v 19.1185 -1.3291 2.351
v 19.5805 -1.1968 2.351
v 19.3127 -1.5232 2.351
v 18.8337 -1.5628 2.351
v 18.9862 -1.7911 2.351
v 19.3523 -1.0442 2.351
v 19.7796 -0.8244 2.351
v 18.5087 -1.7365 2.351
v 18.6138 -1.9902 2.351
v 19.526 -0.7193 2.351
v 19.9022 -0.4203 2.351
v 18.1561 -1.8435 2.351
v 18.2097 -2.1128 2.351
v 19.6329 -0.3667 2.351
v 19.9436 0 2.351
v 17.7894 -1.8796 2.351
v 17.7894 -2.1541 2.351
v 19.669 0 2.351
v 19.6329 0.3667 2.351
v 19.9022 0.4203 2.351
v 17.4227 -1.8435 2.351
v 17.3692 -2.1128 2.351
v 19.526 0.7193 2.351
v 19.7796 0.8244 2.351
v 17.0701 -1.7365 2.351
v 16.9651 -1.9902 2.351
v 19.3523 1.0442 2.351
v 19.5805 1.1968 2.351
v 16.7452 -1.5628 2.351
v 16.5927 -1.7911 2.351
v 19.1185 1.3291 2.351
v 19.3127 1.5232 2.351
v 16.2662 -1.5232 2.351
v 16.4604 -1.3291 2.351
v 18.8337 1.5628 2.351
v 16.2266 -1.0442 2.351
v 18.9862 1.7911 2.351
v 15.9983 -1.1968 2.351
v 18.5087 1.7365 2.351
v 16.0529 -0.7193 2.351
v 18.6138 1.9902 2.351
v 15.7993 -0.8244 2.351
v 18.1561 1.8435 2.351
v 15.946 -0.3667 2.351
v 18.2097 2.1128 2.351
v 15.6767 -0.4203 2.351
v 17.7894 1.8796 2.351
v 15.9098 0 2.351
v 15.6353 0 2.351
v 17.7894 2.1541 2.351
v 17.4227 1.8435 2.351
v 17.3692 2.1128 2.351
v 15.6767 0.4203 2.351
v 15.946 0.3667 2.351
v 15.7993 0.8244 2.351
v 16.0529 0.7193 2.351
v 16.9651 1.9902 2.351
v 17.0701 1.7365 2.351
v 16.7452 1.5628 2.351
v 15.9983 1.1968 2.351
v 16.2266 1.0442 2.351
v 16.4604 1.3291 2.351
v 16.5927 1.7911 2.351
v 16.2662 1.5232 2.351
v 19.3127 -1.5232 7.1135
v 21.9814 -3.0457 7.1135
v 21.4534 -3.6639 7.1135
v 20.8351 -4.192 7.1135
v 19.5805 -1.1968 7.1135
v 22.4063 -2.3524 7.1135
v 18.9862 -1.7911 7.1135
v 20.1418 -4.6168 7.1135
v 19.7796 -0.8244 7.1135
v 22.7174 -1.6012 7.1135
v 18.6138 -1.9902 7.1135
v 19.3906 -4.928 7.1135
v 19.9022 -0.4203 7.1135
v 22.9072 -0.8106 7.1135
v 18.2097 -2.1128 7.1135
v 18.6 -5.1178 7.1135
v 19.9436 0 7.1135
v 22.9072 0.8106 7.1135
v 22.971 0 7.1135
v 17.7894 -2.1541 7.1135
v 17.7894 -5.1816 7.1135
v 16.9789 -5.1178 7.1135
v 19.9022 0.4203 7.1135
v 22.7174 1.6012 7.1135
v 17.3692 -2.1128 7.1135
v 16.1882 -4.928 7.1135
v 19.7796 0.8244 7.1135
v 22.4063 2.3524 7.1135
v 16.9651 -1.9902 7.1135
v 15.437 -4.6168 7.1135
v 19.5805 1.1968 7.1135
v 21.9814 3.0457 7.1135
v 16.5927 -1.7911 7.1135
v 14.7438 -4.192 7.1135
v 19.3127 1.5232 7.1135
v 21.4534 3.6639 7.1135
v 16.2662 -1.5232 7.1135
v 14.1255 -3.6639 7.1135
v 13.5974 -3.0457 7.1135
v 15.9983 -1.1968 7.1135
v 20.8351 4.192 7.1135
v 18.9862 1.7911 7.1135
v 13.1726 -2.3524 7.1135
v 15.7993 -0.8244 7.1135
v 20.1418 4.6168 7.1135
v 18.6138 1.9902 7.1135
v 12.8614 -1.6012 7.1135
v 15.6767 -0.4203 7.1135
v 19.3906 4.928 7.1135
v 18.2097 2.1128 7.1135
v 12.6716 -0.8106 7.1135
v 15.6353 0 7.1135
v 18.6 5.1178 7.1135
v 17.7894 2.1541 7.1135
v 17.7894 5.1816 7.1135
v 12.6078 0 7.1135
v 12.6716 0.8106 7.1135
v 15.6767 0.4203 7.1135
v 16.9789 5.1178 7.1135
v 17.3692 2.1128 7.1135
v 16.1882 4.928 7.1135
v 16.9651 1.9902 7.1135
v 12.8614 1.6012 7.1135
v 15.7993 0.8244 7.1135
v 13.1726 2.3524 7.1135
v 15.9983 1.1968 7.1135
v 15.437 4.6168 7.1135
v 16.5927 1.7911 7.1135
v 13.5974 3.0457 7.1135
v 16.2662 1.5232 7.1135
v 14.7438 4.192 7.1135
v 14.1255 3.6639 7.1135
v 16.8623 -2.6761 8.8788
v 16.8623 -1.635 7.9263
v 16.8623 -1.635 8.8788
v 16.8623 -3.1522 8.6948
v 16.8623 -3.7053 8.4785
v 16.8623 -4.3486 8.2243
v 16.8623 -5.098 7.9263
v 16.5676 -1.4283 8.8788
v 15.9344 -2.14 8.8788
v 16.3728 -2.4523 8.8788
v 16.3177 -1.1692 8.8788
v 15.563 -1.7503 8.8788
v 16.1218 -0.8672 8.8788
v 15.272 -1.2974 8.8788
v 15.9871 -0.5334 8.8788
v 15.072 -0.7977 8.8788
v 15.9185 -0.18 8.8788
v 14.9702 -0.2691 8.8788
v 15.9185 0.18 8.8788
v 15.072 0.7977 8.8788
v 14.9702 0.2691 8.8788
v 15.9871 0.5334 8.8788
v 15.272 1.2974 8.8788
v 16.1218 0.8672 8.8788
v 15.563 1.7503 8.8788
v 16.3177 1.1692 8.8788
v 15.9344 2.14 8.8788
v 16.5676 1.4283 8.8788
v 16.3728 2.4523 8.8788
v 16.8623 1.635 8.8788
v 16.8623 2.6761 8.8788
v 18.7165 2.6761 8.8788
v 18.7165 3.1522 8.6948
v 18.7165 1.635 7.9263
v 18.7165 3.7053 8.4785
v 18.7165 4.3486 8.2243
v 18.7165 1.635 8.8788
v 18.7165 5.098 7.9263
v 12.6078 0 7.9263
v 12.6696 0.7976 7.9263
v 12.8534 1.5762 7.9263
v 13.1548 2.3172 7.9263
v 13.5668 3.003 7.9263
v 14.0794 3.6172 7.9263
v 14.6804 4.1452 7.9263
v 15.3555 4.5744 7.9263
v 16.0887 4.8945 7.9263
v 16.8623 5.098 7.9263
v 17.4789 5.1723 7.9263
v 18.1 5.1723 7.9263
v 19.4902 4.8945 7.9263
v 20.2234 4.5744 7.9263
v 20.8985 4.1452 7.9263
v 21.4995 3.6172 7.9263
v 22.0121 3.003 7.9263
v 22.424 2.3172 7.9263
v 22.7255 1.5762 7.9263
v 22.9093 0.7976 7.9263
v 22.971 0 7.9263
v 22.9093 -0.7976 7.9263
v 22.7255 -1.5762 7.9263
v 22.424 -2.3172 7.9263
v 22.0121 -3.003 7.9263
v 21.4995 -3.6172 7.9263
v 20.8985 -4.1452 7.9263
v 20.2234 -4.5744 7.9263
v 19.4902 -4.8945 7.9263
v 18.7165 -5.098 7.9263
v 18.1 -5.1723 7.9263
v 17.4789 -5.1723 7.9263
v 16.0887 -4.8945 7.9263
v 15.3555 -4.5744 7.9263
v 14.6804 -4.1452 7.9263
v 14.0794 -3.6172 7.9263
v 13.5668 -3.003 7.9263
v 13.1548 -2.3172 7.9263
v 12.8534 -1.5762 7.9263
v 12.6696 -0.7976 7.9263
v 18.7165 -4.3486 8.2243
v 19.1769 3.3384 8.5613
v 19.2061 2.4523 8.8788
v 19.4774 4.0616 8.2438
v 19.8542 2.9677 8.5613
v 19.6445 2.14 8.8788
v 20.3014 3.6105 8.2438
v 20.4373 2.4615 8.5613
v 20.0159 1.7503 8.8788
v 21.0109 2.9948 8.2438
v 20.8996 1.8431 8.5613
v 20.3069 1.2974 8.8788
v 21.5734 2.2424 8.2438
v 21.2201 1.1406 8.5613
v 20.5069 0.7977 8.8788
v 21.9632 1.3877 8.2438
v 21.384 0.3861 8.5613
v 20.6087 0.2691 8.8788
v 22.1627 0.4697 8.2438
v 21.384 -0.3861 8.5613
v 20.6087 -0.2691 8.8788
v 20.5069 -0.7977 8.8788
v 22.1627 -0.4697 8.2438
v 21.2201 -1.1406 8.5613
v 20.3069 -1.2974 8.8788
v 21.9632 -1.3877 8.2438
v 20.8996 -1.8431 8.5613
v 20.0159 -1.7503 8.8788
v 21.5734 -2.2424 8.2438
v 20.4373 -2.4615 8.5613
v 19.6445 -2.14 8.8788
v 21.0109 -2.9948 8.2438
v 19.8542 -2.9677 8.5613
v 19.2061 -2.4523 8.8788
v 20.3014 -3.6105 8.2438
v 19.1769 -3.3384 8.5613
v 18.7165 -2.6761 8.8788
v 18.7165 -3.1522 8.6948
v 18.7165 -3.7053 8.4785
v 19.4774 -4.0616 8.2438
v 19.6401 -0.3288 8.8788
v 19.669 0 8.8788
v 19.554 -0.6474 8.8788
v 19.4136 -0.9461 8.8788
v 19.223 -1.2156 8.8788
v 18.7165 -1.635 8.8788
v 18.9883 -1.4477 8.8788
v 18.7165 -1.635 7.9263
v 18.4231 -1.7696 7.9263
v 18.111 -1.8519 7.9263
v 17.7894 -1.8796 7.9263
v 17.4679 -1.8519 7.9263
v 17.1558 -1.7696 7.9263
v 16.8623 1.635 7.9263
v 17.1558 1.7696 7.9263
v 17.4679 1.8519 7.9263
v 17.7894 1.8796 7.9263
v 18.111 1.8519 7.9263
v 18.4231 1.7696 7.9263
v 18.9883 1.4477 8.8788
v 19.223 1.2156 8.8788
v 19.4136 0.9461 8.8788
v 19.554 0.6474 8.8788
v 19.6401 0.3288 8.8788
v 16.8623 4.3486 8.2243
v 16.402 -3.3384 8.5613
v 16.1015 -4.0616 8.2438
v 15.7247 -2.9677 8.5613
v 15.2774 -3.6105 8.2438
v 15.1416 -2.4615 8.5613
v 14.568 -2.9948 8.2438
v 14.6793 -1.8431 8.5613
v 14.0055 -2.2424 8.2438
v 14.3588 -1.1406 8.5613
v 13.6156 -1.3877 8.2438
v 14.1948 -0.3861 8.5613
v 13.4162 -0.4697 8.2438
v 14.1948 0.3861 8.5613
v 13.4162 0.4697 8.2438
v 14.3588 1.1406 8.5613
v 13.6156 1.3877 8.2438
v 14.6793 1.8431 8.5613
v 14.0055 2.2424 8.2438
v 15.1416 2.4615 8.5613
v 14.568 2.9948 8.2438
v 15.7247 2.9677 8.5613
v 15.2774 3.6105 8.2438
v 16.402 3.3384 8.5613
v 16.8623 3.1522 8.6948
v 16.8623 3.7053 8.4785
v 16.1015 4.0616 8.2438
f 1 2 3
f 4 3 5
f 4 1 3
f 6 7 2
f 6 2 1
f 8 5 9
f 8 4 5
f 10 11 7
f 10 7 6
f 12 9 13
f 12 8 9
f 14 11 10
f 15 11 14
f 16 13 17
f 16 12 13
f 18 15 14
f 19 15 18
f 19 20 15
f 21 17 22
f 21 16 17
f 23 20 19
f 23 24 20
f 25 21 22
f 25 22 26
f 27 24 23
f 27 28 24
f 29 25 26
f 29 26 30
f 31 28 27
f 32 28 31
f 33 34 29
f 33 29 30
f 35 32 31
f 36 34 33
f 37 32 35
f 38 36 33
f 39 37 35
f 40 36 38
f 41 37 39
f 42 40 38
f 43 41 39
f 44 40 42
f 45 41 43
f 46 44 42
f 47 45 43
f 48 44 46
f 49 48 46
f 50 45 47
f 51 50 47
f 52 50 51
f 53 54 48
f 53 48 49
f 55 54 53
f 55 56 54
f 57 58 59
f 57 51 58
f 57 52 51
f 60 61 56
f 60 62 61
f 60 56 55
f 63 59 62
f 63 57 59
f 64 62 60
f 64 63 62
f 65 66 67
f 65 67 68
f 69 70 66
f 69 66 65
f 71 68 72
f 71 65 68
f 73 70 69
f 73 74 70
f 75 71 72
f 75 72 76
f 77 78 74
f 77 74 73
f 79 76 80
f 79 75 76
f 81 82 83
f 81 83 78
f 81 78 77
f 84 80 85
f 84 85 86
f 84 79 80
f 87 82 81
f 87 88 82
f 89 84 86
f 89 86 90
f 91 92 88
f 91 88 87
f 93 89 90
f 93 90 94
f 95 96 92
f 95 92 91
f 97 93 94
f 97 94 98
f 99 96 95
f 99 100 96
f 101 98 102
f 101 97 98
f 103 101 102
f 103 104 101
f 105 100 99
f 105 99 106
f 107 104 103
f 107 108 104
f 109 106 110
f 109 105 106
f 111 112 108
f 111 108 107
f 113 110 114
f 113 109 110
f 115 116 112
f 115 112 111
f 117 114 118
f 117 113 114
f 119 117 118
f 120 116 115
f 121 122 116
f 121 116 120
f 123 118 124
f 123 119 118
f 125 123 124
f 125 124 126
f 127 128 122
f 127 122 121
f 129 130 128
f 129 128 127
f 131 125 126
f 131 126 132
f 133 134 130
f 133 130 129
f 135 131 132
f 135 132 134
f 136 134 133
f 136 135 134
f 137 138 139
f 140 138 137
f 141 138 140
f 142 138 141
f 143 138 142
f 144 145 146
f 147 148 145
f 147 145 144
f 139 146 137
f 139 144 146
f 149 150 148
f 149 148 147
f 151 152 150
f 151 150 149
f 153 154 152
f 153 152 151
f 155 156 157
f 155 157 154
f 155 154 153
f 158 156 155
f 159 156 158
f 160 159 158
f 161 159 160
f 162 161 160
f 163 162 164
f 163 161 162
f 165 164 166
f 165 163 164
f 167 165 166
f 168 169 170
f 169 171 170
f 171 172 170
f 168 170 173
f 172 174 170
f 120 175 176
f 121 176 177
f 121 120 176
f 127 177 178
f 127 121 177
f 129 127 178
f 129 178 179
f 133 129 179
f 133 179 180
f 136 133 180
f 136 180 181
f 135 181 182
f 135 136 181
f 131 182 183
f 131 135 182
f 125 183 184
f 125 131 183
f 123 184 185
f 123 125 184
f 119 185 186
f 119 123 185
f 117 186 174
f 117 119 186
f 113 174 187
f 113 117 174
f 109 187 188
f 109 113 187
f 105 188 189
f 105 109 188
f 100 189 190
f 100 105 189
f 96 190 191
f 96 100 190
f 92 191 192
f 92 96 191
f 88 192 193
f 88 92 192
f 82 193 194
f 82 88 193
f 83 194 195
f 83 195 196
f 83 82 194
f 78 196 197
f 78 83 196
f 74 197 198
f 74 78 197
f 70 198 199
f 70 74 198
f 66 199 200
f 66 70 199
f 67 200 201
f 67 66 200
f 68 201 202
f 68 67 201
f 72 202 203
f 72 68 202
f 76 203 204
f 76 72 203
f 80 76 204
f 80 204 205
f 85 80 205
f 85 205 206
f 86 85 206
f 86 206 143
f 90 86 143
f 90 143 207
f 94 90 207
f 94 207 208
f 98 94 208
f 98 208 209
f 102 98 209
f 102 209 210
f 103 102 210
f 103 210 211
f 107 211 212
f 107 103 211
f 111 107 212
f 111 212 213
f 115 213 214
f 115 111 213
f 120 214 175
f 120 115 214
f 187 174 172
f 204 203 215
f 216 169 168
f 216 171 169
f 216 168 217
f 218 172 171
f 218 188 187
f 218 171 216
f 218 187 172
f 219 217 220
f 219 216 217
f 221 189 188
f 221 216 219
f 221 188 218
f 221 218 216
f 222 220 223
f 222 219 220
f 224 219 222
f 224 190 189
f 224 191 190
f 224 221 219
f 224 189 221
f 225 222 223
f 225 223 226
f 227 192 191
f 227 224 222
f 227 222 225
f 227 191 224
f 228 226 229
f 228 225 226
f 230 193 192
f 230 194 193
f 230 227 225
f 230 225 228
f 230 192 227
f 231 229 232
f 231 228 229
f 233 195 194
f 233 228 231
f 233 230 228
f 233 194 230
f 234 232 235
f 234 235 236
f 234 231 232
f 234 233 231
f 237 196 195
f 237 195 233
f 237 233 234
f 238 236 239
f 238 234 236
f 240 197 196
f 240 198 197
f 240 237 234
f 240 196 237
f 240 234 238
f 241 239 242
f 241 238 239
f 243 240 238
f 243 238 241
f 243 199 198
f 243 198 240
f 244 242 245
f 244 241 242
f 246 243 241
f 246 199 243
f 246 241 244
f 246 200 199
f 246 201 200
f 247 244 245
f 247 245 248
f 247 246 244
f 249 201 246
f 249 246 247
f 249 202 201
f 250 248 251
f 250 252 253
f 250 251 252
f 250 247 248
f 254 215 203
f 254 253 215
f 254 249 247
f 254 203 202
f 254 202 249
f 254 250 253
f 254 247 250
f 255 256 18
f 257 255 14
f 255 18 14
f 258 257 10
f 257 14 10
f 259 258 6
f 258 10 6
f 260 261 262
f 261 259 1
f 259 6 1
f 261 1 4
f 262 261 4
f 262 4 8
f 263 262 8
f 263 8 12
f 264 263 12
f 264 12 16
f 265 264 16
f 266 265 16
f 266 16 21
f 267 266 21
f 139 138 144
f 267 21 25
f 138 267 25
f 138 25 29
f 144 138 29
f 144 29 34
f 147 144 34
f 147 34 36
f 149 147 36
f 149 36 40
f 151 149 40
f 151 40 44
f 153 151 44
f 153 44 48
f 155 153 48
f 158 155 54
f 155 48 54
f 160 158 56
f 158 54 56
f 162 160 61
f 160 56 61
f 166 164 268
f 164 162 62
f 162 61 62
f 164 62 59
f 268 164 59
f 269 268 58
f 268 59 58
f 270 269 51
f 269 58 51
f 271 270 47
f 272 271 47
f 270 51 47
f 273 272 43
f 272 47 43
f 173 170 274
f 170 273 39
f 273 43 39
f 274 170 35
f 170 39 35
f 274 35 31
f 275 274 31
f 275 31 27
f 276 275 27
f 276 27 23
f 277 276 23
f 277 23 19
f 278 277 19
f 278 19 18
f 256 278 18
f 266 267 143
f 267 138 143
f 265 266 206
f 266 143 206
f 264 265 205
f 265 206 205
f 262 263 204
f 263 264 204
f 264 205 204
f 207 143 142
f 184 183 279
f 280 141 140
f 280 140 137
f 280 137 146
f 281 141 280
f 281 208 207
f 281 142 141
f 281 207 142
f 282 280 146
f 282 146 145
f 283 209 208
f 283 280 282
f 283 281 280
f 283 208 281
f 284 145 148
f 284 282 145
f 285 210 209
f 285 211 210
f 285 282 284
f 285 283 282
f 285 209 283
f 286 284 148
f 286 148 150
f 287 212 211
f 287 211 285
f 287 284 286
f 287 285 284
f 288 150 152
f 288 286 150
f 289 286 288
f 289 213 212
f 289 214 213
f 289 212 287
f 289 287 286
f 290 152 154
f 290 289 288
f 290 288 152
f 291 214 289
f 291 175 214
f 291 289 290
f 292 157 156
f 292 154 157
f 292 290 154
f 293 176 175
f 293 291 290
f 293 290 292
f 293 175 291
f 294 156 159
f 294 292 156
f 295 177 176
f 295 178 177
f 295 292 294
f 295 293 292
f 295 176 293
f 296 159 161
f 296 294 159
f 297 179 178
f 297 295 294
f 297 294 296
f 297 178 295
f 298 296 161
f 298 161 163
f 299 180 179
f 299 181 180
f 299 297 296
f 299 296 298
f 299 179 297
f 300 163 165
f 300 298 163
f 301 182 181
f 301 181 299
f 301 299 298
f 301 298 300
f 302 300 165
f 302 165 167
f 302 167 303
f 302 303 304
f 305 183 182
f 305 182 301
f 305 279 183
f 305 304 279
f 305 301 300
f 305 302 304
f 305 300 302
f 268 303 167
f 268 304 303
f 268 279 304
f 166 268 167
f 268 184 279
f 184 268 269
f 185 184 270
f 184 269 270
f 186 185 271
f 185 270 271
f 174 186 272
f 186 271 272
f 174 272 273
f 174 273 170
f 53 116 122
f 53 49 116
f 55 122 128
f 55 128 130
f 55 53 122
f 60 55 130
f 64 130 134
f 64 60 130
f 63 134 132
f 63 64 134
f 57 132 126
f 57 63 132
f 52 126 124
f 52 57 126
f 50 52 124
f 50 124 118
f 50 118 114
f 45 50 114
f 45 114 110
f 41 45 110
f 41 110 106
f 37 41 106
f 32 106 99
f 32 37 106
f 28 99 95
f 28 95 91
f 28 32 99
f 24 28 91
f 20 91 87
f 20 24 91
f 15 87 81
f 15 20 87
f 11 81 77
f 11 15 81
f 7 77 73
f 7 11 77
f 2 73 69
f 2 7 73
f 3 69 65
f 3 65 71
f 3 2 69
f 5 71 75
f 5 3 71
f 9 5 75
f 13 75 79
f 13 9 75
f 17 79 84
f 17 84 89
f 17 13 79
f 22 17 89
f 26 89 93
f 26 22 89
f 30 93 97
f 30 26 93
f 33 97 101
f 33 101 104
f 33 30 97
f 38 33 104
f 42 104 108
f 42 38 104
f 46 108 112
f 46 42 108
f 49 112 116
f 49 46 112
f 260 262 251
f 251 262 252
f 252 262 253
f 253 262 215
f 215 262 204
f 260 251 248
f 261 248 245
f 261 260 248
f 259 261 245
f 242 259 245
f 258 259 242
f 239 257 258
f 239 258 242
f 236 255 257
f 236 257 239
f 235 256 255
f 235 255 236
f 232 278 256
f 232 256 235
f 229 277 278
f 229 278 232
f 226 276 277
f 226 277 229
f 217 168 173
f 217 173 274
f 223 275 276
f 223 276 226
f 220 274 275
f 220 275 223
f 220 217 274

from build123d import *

# Parameters (mm, degrees)
F2_W     = 1.8542
F2_H     = 0.9525
F3_DEPTH = 6.35
F4_R     = 1.8796
F5_DEPTH = 6.5288


with BuildPart() as f1:
    # F0 (on Front) → F1 (revolve)
    with BuildSketch(Plane.XZ):
        Polygon((17.789439, 2.350953), (17.789439, 8.878753), (14.957339, 8.878753), (12.607839, 7.926253), (12.607839, 7.113453), (15.635291, 7.113453), (15.635291, 2.350953), align=None)
    revolve(axis=Axis((17.789439, 0, 5.614853), (0, 0, -1)))

    # F2 (on Front) → F3 (cut, symmetric)
    with BuildSketch(Plane.XZ):
        with Locations((17.789439, 8.402503)):
            Rectangle(F2_W, F2_H)
    extrude(amount=F3_DEPTH, both=True, mode=Mode.SUBTRACT)

    # F4 (on face) → F5 (cut, through all)
    with BuildSketch(Plane(origin=(0, 0, 2.350953), x_dir=(1, 0, 0), z_dir=(0, 0, -1))):
        with Locations((17.789439, 0)):
            Circle(F4_R)
    extrude(amount=-F5_DEPTH, mode=Mode.SUBTRACT)


solid = f1.part
